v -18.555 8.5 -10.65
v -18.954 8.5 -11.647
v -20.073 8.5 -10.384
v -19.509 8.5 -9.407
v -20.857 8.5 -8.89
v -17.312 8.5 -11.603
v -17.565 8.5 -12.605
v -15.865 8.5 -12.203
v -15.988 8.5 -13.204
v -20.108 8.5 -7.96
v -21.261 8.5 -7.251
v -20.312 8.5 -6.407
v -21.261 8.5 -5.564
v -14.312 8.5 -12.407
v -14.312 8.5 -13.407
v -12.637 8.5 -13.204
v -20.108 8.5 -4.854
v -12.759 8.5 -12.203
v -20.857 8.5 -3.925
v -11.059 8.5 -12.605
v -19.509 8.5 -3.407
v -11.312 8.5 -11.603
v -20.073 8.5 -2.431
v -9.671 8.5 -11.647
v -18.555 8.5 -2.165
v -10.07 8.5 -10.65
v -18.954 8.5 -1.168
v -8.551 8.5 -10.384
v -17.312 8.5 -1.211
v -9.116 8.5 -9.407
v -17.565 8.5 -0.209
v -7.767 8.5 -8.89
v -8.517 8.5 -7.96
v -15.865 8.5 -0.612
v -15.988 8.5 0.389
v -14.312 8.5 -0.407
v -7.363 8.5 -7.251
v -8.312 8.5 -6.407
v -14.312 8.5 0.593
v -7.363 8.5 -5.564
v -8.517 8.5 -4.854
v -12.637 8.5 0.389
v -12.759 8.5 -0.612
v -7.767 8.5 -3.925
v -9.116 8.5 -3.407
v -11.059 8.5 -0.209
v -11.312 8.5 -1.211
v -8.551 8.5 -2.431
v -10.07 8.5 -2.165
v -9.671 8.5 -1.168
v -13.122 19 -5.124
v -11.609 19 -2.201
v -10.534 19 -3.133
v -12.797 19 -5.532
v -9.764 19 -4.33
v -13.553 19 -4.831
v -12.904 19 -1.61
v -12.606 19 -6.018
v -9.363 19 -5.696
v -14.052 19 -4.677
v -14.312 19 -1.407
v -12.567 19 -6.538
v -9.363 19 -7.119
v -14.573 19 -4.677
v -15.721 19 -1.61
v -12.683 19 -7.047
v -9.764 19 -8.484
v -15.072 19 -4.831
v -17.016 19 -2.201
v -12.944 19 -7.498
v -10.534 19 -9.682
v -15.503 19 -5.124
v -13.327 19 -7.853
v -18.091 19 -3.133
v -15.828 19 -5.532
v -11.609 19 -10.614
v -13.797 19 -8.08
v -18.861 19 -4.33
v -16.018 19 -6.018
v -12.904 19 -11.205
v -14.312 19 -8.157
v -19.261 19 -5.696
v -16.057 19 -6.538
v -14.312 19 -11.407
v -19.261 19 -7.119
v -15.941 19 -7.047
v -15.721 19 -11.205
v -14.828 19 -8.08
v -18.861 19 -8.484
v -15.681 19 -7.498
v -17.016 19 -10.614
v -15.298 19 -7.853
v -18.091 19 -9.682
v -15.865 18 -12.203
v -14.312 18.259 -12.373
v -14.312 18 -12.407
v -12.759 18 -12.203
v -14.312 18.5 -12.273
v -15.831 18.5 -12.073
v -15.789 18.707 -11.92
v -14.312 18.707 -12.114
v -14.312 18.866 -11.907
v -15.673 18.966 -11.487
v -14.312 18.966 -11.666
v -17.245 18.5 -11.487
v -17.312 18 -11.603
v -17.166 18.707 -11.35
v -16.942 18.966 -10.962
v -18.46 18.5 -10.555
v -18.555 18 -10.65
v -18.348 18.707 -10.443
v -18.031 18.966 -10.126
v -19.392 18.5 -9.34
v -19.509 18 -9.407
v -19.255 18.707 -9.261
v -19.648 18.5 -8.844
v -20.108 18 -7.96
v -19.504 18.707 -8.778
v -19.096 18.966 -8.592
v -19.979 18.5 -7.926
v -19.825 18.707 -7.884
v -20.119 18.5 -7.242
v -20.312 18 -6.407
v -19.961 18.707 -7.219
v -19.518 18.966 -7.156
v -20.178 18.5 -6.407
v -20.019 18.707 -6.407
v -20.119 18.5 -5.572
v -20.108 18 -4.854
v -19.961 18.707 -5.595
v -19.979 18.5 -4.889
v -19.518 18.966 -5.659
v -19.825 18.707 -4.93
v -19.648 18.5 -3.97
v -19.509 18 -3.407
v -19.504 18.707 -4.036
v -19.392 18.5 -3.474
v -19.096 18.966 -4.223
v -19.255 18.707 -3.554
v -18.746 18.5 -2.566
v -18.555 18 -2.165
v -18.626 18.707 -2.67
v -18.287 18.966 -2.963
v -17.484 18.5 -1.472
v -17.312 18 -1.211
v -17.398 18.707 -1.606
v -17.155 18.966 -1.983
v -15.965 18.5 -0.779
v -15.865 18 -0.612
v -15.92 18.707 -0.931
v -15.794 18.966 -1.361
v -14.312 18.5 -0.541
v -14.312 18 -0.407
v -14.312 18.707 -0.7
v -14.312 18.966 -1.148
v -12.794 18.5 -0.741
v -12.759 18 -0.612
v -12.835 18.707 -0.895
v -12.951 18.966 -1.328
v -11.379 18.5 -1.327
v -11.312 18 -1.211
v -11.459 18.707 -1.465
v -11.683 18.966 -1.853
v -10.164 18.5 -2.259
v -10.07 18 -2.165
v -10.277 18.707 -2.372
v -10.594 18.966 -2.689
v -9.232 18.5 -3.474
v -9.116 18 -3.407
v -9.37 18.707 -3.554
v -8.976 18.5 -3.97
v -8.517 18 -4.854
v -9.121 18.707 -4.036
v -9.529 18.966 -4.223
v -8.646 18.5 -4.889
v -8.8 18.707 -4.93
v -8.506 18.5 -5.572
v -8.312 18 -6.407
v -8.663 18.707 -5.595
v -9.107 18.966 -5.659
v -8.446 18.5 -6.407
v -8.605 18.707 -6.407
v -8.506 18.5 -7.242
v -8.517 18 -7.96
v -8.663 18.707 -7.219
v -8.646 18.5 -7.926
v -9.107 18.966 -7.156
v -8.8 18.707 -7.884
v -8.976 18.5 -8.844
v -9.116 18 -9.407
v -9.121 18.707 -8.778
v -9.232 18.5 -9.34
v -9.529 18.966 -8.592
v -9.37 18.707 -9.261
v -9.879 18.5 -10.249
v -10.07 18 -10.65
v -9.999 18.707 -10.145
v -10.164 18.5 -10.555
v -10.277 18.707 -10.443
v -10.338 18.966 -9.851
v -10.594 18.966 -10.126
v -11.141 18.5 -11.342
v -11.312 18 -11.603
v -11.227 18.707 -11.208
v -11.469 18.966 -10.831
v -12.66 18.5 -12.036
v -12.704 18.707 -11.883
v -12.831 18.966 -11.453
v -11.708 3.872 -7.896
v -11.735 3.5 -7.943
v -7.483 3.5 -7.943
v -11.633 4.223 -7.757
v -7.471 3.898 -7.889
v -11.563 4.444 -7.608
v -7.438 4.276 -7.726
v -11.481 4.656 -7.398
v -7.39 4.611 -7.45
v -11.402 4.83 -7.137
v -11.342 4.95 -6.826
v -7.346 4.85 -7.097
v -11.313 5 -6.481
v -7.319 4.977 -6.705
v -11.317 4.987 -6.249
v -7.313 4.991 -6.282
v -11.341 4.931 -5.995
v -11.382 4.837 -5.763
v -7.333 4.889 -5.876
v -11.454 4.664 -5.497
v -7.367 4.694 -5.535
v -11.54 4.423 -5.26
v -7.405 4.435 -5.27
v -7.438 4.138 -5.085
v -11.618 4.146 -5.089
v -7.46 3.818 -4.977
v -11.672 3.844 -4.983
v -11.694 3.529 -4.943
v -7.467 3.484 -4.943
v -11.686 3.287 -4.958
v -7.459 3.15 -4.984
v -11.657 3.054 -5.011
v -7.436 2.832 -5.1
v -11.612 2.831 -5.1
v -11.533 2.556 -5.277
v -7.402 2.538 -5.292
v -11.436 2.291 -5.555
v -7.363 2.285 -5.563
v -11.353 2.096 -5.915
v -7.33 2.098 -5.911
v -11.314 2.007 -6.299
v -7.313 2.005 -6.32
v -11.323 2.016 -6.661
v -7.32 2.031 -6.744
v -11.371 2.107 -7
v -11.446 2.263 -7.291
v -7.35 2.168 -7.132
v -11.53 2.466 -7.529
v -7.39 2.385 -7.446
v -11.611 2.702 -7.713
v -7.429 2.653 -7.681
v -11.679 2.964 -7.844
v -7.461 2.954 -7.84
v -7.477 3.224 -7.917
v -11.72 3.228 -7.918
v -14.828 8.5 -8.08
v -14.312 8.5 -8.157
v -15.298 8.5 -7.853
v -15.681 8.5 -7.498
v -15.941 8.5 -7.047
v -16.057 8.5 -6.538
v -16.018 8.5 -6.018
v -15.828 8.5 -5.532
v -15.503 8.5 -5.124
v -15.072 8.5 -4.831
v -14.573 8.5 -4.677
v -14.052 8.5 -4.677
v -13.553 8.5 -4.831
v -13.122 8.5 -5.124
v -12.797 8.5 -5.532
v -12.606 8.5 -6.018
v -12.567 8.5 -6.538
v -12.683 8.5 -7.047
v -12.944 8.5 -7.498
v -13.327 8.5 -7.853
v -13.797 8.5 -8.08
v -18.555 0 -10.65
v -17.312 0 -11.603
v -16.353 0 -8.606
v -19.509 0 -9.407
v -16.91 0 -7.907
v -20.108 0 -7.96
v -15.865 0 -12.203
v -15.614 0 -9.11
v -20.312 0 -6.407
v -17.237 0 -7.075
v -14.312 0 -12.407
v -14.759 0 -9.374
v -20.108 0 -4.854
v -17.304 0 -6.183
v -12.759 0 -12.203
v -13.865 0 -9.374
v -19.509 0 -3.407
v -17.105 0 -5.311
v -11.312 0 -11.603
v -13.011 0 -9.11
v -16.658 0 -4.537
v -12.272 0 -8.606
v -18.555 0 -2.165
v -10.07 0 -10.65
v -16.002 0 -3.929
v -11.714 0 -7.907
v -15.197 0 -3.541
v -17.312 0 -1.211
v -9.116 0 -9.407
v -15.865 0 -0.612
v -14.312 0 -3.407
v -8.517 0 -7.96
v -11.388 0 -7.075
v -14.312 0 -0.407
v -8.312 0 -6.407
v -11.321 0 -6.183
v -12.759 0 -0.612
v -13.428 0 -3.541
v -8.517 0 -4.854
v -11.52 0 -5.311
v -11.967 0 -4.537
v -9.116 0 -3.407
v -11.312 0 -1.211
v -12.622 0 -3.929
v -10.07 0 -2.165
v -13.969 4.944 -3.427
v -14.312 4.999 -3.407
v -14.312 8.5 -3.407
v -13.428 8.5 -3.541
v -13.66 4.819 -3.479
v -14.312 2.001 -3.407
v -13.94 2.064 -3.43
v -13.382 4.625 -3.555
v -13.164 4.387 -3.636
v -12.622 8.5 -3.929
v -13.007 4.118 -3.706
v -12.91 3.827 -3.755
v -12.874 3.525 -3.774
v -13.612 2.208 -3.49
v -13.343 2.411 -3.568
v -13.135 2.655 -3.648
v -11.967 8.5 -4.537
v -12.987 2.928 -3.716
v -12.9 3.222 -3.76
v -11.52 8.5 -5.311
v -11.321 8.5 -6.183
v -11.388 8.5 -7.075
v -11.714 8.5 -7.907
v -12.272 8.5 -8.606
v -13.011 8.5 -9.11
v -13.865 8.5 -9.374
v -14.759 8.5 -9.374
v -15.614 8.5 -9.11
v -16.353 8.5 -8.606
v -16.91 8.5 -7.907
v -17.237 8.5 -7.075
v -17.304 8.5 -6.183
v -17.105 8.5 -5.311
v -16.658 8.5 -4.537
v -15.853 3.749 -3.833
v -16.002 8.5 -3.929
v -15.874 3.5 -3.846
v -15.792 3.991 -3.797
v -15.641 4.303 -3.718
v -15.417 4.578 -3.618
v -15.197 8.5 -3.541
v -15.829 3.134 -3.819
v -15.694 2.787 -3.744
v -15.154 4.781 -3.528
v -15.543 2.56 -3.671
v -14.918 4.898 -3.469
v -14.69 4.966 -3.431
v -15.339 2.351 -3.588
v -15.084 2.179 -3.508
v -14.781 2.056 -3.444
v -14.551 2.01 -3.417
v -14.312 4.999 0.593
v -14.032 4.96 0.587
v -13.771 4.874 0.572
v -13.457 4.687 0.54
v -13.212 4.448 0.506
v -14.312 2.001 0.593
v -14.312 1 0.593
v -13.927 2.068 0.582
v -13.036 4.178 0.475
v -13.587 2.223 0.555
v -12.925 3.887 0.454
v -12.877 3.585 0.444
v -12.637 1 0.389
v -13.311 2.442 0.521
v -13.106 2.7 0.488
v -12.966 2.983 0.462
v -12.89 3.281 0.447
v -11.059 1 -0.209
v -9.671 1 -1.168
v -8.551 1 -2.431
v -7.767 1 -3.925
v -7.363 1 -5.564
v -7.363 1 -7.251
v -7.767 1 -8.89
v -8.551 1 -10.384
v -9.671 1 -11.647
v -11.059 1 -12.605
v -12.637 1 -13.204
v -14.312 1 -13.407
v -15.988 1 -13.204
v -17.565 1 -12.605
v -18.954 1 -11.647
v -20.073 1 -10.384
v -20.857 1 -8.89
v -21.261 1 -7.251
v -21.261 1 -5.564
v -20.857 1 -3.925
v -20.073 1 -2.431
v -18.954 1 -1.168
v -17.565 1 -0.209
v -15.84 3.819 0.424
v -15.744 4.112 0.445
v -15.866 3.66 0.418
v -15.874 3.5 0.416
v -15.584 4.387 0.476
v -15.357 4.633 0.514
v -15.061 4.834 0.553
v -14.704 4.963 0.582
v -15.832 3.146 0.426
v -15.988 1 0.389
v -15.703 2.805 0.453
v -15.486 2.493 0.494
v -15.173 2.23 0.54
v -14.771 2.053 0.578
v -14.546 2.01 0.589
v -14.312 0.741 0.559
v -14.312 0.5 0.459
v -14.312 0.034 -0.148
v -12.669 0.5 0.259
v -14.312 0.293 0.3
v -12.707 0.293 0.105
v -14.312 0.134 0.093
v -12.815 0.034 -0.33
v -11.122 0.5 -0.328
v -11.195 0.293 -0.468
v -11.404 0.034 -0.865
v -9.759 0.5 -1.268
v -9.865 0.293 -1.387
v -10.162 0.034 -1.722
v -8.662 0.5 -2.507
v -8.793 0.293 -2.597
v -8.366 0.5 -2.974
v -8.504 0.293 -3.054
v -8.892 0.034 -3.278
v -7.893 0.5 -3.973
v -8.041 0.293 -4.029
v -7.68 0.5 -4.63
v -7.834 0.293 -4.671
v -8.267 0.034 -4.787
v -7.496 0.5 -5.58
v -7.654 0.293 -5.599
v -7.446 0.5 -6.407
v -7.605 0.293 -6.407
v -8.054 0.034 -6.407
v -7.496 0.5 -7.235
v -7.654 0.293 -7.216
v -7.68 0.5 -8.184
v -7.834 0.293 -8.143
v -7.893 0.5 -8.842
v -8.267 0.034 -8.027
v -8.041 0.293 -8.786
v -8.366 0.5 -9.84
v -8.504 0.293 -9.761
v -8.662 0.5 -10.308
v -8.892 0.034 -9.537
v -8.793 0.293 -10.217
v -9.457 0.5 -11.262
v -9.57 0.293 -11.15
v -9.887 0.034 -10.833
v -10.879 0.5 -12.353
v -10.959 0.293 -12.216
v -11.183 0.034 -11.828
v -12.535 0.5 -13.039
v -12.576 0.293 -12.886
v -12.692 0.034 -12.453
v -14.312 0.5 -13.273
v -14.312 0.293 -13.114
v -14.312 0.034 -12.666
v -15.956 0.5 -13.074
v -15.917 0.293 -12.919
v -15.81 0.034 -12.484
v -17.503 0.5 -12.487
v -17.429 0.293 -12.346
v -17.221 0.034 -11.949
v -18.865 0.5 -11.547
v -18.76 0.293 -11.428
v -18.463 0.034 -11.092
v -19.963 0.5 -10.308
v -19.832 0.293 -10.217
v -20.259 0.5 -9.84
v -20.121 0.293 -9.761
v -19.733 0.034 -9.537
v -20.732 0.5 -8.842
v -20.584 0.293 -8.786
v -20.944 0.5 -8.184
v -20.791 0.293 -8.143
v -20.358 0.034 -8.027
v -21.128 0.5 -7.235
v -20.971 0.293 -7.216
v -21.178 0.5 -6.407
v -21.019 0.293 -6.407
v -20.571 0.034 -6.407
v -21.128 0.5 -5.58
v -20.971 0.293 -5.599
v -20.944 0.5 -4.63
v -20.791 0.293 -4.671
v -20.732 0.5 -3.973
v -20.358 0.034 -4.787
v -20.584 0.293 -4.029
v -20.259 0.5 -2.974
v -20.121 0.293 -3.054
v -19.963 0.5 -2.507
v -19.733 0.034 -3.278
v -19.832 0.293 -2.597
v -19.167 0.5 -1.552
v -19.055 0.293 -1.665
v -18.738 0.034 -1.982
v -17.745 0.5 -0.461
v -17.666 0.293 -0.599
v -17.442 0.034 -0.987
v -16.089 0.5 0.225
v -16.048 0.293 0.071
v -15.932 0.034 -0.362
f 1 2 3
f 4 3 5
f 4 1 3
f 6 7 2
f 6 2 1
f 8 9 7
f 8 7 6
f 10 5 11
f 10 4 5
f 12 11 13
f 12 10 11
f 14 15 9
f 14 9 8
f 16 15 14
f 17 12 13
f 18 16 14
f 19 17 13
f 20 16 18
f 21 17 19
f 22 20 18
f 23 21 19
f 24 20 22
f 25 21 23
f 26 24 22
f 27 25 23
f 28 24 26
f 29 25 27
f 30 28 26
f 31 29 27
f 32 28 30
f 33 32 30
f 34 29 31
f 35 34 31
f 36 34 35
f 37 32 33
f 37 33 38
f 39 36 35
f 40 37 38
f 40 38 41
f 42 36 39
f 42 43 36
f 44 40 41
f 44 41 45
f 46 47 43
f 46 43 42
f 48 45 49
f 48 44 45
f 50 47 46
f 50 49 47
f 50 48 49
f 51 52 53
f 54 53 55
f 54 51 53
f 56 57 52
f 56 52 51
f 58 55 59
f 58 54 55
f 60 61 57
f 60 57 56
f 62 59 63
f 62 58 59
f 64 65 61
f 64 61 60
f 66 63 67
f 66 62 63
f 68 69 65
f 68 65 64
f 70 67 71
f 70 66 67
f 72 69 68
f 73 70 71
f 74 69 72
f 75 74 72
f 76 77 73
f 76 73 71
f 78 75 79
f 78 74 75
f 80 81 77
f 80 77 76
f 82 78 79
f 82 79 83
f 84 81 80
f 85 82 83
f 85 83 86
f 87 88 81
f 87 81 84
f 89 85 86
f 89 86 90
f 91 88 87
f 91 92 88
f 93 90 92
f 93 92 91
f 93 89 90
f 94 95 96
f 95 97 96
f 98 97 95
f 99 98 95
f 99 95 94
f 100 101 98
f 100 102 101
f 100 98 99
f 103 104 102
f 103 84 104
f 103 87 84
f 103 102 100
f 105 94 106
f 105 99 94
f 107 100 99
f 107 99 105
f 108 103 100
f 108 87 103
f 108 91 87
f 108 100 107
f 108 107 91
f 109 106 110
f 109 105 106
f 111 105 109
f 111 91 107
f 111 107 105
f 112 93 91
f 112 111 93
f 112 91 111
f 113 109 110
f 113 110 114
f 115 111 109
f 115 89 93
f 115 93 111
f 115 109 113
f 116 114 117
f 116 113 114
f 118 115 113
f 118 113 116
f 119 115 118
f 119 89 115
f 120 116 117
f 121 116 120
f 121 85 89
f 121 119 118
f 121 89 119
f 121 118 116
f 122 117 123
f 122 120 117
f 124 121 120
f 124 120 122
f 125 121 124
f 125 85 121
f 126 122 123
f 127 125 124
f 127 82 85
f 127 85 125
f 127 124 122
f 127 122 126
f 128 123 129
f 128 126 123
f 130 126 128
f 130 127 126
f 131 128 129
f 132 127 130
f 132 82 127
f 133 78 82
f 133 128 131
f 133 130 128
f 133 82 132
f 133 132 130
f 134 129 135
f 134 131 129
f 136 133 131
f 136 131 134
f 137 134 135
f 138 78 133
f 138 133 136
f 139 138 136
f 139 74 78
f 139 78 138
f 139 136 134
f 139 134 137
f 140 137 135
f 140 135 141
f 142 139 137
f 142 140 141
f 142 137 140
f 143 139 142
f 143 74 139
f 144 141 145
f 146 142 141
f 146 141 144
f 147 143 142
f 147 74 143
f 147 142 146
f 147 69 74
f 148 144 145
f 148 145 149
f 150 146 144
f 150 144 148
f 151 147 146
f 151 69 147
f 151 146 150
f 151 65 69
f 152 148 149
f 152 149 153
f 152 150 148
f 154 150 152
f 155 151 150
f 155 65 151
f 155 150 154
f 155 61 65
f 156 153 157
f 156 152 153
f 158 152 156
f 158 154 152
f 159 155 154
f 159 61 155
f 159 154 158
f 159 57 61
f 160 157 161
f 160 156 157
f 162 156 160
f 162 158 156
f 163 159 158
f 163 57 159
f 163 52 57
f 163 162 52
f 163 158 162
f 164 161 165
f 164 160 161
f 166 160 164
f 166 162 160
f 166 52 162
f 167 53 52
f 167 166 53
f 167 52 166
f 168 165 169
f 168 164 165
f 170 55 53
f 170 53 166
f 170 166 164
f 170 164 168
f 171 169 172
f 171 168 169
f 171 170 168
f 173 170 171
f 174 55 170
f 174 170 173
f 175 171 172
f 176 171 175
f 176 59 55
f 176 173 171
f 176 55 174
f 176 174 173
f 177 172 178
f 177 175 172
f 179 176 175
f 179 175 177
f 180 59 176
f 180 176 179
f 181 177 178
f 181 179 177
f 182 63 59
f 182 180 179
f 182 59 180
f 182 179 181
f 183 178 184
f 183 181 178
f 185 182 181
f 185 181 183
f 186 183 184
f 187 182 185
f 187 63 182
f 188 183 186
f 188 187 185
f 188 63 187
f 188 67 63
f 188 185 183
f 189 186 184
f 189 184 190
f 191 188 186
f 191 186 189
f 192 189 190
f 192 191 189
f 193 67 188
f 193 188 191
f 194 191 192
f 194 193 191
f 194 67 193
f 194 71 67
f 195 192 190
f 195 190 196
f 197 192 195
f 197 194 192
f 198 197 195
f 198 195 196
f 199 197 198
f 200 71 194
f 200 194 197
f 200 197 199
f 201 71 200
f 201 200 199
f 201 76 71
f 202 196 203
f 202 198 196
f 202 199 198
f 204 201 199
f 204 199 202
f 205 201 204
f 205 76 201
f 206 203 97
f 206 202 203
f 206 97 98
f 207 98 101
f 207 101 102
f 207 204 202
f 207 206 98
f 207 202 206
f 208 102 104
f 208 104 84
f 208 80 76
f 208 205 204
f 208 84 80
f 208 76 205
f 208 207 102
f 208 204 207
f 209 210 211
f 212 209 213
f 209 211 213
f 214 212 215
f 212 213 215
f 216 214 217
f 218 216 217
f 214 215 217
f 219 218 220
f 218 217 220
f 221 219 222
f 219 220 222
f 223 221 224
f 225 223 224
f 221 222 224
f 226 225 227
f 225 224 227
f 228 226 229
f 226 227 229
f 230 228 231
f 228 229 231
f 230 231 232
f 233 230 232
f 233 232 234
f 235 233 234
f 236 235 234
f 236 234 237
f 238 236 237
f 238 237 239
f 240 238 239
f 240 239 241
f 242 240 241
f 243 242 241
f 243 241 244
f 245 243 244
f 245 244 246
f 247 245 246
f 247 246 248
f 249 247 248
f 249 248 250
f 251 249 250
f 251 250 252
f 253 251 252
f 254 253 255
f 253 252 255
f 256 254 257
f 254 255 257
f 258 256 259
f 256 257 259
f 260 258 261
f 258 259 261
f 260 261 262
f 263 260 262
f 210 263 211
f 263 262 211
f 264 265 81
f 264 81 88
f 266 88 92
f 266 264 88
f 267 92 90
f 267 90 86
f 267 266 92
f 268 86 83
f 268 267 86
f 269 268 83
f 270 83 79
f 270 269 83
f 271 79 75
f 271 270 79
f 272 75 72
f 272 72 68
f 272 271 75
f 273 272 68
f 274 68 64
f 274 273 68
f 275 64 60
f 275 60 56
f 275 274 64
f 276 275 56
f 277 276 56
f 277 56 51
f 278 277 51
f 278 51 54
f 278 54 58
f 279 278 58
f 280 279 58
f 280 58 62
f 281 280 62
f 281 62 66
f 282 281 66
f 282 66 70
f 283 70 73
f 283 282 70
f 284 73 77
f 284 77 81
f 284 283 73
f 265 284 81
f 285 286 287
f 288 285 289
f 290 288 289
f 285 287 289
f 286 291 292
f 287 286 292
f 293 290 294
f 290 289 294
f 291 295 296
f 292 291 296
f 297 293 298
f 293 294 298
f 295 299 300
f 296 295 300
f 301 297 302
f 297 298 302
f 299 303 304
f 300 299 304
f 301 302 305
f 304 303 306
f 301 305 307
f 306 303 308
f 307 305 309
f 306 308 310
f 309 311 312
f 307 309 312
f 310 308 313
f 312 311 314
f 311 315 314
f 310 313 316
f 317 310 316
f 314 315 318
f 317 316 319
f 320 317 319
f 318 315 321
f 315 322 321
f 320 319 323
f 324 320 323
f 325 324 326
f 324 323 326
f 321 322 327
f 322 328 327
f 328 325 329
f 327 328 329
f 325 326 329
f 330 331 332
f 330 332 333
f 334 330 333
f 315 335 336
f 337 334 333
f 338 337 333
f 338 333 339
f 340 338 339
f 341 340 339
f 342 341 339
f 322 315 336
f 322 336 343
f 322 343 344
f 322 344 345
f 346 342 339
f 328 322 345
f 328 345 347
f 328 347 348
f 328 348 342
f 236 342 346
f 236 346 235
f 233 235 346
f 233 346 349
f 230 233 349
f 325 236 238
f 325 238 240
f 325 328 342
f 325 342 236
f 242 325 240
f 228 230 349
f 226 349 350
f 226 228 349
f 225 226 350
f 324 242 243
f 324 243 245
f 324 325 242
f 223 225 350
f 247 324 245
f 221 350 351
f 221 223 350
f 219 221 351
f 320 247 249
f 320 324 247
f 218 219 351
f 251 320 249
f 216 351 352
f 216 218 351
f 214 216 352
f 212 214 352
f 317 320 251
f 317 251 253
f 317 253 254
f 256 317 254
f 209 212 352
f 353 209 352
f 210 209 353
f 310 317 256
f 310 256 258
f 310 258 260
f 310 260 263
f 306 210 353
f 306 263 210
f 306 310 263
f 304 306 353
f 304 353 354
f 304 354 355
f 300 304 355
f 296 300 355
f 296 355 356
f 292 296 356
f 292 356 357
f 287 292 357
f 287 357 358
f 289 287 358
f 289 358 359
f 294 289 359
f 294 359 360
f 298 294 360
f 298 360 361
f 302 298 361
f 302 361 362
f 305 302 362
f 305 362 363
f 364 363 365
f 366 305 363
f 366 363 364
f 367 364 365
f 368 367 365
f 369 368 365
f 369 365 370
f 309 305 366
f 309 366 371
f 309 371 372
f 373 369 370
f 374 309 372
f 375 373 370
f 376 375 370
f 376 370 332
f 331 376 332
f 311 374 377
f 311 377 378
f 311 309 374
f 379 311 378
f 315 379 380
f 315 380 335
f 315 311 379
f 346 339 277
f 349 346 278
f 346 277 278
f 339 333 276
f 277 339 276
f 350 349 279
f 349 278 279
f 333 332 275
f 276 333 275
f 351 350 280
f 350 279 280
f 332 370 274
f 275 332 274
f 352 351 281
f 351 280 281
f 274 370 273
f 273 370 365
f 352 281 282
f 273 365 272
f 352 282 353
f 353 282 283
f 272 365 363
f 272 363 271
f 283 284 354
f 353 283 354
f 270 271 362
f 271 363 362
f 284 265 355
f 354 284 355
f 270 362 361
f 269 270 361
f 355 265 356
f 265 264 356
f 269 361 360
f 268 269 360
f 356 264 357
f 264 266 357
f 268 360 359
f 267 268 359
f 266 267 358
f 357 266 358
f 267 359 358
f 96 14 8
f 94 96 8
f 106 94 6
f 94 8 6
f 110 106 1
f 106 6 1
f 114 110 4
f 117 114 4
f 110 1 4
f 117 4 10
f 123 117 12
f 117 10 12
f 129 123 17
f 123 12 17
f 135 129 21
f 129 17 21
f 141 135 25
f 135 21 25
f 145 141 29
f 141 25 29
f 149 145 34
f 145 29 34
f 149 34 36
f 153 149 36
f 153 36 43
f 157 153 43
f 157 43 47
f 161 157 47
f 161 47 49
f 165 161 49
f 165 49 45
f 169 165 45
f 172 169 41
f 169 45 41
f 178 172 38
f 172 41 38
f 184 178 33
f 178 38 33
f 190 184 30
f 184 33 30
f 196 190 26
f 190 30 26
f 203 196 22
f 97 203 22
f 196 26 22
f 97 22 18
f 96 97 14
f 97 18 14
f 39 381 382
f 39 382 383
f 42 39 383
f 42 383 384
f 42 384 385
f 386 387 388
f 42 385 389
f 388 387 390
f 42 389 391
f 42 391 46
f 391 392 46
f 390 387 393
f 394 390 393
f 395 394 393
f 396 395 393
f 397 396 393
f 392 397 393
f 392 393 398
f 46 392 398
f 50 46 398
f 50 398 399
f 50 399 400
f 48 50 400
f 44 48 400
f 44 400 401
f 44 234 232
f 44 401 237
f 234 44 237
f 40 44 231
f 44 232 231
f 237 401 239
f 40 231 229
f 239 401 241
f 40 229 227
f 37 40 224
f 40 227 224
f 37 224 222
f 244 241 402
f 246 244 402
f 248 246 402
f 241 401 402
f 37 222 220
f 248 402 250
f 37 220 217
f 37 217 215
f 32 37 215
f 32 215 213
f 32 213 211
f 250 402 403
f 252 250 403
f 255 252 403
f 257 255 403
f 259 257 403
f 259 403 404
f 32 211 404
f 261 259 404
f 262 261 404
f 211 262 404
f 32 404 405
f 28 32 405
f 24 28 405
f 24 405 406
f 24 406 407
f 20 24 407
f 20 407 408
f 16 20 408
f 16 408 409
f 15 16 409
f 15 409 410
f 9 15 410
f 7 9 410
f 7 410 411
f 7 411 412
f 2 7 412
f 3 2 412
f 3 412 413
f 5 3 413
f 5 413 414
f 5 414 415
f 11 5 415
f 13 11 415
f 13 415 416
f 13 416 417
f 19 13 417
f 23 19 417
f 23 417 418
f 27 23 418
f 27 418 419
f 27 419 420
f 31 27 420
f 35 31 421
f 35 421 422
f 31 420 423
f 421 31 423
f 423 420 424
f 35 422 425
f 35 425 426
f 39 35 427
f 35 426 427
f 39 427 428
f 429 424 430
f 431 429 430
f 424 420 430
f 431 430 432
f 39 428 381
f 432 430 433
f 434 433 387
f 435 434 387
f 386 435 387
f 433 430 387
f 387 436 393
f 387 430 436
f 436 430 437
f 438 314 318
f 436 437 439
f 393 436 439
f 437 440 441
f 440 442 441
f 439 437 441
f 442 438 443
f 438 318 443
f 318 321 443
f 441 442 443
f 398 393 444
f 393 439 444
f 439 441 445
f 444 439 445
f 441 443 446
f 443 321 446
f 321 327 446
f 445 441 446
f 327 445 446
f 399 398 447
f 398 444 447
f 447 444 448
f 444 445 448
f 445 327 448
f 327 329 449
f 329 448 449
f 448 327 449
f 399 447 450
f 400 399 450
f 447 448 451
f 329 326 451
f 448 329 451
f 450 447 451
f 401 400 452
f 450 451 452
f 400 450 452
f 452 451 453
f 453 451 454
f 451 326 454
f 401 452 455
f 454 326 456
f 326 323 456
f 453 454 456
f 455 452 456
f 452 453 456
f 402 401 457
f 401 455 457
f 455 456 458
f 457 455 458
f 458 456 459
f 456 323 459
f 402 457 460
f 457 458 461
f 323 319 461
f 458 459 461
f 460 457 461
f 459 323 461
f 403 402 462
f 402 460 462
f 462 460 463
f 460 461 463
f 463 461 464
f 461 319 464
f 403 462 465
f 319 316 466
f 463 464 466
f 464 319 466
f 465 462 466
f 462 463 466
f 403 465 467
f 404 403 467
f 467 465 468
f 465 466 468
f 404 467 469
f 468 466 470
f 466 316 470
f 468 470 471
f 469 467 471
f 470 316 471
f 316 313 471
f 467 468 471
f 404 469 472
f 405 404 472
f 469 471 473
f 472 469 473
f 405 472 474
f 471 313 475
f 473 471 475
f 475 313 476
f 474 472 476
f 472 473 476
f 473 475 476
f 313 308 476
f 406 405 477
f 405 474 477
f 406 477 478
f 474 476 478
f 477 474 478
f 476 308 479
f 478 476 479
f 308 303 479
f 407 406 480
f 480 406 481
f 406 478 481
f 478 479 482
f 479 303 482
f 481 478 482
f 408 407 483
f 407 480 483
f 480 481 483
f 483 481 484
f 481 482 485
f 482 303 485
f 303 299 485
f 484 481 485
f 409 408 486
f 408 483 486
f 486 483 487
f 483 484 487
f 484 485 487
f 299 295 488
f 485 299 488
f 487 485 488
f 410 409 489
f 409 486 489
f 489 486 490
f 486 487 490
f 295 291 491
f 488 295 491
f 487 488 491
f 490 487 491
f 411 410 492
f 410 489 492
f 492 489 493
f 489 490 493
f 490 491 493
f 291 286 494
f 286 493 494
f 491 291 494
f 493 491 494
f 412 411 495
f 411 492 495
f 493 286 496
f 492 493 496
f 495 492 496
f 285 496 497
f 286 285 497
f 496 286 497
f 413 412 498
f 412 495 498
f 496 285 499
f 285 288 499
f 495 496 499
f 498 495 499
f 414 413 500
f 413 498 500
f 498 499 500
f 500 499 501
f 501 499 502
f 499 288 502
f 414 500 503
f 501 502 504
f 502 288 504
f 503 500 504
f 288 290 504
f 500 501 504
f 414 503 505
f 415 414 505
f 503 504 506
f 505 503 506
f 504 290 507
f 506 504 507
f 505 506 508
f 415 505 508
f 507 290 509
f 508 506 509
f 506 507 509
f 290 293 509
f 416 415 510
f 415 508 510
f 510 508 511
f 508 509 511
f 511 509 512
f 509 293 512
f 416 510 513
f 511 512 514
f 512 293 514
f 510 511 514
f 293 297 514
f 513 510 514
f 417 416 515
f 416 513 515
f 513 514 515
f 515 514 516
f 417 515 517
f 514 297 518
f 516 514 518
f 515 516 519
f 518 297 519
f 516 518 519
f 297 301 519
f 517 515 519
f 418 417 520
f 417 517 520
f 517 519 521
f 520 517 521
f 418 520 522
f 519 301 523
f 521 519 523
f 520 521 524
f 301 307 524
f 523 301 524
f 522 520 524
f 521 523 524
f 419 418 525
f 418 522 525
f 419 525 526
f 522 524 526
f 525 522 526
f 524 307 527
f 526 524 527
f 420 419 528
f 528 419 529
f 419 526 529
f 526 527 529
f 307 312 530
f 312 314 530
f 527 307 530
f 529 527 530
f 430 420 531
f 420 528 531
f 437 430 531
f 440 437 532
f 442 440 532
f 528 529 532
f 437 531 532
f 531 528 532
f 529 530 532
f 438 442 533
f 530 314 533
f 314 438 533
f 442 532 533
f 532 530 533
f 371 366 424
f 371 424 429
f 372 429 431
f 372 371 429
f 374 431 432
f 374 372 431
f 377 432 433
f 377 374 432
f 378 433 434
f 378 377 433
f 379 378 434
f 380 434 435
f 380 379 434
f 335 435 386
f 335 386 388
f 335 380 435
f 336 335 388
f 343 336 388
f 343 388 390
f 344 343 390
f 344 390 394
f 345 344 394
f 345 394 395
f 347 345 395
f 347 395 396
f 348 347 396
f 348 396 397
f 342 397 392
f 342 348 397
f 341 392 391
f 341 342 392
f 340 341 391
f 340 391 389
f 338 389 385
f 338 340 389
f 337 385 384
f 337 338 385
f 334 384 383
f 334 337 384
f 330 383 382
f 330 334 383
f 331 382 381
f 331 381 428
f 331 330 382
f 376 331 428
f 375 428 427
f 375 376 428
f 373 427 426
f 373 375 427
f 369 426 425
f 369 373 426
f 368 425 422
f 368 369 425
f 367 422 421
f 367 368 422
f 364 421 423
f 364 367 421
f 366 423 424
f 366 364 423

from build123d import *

# Parameters (mm, degrees)
SKETCH_1_R               = 7
SKETCH_1_R_2             = 3
EXTRUDE_1_DEPTH          = 8.5
SKETCH_2_R               = 6
SKETCH_2_R_2             = 1.75
EXTRUDE_2_DEPTH          = 10.5
FILLET_1_R               = 1
SKETCH_3_R               = 1.5
CUT_EXTRUDE_1_DEPTH      = 14.5
CUT_EXTRUDE_2_DEPTH      = 6.5
CUT_EXTRUDE_2_DEPTH_BACK = 6.5
SKETCH_4_R               = 1.5


with BuildPart() as part:
    # 草图1 → 凸台-拉伸1 (new body)
    with BuildSketch(Plane(origin=(0, 0, 0), x_dir=(1, 0, 0), z_dir=(0, 1, 0))):
        with Locations((-14.312366838, 6.407280503)):
            Circle(SKETCH_1_R)
        with Locations((-14.312366838, 6.407280503)):
            Circle(SKETCH_1_R_2, mode=Mode.SUBTRACT)
    extrude(amount=EXTRUDE_1_DEPTH)

    # 草图2 → 凸台-拉伸2 (add)
    with BuildSketch(Plane(origin=(0, 8.5, 0), x_dir=(1, 0, 0), z_dir=(0, 1, 0))):
        with Locations((-14.312366838, 6.407280503)):
            Circle(SKETCH_2_R)
        with Locations((-14.312366838, 6.407280503)):
            Circle(SKETCH_2_R_2, mode=Mode.SUBTRACT)
    extrude(amount=EXTRUDE_2_DEPTH)

    # 圆角1
    fillet_1_edges = [part.edges().sort_by_distance(p)[0] for p in [
        (-21.312366838, 0, -6.407280503),
        (-20.312366838, 19, -6.407280503),
    ]]
    fillet(fillet_1_edges, radius=FILLET_1_R)

    # 草图3 → 切除-拉伸1 (cut)
    with BuildSketch(Plane(origin=(0, 0, 0), x_dir=(0, 0, -1), z_dir=(1, 0, 0))):
        with Locations((6.442812973, 3.5)):
            Circle(SKETCH_3_R)
    extrude(amount=-CUT_EXTRUDE_1_DEPTH, mode=Mode.SUBTRACT)

    # 草图4 → 切除-拉伸2 (cut, two sides: drawn at the far end of the back side and taken through both)
    with BuildSketch(Plane.XY.offset(-CUT_EXTRUDE_2_DEPTH_BACK)):
        with Locations((-14.374144883, 3.5)):
            Circle(SKETCH_4_R)
    extrude(amount=CUT_EXTRUDE_2_DEPTH + CUT_EXTRUDE_2_DEPTH_BACK, mode=Mode.SUBTRACT)


solid = part.part
